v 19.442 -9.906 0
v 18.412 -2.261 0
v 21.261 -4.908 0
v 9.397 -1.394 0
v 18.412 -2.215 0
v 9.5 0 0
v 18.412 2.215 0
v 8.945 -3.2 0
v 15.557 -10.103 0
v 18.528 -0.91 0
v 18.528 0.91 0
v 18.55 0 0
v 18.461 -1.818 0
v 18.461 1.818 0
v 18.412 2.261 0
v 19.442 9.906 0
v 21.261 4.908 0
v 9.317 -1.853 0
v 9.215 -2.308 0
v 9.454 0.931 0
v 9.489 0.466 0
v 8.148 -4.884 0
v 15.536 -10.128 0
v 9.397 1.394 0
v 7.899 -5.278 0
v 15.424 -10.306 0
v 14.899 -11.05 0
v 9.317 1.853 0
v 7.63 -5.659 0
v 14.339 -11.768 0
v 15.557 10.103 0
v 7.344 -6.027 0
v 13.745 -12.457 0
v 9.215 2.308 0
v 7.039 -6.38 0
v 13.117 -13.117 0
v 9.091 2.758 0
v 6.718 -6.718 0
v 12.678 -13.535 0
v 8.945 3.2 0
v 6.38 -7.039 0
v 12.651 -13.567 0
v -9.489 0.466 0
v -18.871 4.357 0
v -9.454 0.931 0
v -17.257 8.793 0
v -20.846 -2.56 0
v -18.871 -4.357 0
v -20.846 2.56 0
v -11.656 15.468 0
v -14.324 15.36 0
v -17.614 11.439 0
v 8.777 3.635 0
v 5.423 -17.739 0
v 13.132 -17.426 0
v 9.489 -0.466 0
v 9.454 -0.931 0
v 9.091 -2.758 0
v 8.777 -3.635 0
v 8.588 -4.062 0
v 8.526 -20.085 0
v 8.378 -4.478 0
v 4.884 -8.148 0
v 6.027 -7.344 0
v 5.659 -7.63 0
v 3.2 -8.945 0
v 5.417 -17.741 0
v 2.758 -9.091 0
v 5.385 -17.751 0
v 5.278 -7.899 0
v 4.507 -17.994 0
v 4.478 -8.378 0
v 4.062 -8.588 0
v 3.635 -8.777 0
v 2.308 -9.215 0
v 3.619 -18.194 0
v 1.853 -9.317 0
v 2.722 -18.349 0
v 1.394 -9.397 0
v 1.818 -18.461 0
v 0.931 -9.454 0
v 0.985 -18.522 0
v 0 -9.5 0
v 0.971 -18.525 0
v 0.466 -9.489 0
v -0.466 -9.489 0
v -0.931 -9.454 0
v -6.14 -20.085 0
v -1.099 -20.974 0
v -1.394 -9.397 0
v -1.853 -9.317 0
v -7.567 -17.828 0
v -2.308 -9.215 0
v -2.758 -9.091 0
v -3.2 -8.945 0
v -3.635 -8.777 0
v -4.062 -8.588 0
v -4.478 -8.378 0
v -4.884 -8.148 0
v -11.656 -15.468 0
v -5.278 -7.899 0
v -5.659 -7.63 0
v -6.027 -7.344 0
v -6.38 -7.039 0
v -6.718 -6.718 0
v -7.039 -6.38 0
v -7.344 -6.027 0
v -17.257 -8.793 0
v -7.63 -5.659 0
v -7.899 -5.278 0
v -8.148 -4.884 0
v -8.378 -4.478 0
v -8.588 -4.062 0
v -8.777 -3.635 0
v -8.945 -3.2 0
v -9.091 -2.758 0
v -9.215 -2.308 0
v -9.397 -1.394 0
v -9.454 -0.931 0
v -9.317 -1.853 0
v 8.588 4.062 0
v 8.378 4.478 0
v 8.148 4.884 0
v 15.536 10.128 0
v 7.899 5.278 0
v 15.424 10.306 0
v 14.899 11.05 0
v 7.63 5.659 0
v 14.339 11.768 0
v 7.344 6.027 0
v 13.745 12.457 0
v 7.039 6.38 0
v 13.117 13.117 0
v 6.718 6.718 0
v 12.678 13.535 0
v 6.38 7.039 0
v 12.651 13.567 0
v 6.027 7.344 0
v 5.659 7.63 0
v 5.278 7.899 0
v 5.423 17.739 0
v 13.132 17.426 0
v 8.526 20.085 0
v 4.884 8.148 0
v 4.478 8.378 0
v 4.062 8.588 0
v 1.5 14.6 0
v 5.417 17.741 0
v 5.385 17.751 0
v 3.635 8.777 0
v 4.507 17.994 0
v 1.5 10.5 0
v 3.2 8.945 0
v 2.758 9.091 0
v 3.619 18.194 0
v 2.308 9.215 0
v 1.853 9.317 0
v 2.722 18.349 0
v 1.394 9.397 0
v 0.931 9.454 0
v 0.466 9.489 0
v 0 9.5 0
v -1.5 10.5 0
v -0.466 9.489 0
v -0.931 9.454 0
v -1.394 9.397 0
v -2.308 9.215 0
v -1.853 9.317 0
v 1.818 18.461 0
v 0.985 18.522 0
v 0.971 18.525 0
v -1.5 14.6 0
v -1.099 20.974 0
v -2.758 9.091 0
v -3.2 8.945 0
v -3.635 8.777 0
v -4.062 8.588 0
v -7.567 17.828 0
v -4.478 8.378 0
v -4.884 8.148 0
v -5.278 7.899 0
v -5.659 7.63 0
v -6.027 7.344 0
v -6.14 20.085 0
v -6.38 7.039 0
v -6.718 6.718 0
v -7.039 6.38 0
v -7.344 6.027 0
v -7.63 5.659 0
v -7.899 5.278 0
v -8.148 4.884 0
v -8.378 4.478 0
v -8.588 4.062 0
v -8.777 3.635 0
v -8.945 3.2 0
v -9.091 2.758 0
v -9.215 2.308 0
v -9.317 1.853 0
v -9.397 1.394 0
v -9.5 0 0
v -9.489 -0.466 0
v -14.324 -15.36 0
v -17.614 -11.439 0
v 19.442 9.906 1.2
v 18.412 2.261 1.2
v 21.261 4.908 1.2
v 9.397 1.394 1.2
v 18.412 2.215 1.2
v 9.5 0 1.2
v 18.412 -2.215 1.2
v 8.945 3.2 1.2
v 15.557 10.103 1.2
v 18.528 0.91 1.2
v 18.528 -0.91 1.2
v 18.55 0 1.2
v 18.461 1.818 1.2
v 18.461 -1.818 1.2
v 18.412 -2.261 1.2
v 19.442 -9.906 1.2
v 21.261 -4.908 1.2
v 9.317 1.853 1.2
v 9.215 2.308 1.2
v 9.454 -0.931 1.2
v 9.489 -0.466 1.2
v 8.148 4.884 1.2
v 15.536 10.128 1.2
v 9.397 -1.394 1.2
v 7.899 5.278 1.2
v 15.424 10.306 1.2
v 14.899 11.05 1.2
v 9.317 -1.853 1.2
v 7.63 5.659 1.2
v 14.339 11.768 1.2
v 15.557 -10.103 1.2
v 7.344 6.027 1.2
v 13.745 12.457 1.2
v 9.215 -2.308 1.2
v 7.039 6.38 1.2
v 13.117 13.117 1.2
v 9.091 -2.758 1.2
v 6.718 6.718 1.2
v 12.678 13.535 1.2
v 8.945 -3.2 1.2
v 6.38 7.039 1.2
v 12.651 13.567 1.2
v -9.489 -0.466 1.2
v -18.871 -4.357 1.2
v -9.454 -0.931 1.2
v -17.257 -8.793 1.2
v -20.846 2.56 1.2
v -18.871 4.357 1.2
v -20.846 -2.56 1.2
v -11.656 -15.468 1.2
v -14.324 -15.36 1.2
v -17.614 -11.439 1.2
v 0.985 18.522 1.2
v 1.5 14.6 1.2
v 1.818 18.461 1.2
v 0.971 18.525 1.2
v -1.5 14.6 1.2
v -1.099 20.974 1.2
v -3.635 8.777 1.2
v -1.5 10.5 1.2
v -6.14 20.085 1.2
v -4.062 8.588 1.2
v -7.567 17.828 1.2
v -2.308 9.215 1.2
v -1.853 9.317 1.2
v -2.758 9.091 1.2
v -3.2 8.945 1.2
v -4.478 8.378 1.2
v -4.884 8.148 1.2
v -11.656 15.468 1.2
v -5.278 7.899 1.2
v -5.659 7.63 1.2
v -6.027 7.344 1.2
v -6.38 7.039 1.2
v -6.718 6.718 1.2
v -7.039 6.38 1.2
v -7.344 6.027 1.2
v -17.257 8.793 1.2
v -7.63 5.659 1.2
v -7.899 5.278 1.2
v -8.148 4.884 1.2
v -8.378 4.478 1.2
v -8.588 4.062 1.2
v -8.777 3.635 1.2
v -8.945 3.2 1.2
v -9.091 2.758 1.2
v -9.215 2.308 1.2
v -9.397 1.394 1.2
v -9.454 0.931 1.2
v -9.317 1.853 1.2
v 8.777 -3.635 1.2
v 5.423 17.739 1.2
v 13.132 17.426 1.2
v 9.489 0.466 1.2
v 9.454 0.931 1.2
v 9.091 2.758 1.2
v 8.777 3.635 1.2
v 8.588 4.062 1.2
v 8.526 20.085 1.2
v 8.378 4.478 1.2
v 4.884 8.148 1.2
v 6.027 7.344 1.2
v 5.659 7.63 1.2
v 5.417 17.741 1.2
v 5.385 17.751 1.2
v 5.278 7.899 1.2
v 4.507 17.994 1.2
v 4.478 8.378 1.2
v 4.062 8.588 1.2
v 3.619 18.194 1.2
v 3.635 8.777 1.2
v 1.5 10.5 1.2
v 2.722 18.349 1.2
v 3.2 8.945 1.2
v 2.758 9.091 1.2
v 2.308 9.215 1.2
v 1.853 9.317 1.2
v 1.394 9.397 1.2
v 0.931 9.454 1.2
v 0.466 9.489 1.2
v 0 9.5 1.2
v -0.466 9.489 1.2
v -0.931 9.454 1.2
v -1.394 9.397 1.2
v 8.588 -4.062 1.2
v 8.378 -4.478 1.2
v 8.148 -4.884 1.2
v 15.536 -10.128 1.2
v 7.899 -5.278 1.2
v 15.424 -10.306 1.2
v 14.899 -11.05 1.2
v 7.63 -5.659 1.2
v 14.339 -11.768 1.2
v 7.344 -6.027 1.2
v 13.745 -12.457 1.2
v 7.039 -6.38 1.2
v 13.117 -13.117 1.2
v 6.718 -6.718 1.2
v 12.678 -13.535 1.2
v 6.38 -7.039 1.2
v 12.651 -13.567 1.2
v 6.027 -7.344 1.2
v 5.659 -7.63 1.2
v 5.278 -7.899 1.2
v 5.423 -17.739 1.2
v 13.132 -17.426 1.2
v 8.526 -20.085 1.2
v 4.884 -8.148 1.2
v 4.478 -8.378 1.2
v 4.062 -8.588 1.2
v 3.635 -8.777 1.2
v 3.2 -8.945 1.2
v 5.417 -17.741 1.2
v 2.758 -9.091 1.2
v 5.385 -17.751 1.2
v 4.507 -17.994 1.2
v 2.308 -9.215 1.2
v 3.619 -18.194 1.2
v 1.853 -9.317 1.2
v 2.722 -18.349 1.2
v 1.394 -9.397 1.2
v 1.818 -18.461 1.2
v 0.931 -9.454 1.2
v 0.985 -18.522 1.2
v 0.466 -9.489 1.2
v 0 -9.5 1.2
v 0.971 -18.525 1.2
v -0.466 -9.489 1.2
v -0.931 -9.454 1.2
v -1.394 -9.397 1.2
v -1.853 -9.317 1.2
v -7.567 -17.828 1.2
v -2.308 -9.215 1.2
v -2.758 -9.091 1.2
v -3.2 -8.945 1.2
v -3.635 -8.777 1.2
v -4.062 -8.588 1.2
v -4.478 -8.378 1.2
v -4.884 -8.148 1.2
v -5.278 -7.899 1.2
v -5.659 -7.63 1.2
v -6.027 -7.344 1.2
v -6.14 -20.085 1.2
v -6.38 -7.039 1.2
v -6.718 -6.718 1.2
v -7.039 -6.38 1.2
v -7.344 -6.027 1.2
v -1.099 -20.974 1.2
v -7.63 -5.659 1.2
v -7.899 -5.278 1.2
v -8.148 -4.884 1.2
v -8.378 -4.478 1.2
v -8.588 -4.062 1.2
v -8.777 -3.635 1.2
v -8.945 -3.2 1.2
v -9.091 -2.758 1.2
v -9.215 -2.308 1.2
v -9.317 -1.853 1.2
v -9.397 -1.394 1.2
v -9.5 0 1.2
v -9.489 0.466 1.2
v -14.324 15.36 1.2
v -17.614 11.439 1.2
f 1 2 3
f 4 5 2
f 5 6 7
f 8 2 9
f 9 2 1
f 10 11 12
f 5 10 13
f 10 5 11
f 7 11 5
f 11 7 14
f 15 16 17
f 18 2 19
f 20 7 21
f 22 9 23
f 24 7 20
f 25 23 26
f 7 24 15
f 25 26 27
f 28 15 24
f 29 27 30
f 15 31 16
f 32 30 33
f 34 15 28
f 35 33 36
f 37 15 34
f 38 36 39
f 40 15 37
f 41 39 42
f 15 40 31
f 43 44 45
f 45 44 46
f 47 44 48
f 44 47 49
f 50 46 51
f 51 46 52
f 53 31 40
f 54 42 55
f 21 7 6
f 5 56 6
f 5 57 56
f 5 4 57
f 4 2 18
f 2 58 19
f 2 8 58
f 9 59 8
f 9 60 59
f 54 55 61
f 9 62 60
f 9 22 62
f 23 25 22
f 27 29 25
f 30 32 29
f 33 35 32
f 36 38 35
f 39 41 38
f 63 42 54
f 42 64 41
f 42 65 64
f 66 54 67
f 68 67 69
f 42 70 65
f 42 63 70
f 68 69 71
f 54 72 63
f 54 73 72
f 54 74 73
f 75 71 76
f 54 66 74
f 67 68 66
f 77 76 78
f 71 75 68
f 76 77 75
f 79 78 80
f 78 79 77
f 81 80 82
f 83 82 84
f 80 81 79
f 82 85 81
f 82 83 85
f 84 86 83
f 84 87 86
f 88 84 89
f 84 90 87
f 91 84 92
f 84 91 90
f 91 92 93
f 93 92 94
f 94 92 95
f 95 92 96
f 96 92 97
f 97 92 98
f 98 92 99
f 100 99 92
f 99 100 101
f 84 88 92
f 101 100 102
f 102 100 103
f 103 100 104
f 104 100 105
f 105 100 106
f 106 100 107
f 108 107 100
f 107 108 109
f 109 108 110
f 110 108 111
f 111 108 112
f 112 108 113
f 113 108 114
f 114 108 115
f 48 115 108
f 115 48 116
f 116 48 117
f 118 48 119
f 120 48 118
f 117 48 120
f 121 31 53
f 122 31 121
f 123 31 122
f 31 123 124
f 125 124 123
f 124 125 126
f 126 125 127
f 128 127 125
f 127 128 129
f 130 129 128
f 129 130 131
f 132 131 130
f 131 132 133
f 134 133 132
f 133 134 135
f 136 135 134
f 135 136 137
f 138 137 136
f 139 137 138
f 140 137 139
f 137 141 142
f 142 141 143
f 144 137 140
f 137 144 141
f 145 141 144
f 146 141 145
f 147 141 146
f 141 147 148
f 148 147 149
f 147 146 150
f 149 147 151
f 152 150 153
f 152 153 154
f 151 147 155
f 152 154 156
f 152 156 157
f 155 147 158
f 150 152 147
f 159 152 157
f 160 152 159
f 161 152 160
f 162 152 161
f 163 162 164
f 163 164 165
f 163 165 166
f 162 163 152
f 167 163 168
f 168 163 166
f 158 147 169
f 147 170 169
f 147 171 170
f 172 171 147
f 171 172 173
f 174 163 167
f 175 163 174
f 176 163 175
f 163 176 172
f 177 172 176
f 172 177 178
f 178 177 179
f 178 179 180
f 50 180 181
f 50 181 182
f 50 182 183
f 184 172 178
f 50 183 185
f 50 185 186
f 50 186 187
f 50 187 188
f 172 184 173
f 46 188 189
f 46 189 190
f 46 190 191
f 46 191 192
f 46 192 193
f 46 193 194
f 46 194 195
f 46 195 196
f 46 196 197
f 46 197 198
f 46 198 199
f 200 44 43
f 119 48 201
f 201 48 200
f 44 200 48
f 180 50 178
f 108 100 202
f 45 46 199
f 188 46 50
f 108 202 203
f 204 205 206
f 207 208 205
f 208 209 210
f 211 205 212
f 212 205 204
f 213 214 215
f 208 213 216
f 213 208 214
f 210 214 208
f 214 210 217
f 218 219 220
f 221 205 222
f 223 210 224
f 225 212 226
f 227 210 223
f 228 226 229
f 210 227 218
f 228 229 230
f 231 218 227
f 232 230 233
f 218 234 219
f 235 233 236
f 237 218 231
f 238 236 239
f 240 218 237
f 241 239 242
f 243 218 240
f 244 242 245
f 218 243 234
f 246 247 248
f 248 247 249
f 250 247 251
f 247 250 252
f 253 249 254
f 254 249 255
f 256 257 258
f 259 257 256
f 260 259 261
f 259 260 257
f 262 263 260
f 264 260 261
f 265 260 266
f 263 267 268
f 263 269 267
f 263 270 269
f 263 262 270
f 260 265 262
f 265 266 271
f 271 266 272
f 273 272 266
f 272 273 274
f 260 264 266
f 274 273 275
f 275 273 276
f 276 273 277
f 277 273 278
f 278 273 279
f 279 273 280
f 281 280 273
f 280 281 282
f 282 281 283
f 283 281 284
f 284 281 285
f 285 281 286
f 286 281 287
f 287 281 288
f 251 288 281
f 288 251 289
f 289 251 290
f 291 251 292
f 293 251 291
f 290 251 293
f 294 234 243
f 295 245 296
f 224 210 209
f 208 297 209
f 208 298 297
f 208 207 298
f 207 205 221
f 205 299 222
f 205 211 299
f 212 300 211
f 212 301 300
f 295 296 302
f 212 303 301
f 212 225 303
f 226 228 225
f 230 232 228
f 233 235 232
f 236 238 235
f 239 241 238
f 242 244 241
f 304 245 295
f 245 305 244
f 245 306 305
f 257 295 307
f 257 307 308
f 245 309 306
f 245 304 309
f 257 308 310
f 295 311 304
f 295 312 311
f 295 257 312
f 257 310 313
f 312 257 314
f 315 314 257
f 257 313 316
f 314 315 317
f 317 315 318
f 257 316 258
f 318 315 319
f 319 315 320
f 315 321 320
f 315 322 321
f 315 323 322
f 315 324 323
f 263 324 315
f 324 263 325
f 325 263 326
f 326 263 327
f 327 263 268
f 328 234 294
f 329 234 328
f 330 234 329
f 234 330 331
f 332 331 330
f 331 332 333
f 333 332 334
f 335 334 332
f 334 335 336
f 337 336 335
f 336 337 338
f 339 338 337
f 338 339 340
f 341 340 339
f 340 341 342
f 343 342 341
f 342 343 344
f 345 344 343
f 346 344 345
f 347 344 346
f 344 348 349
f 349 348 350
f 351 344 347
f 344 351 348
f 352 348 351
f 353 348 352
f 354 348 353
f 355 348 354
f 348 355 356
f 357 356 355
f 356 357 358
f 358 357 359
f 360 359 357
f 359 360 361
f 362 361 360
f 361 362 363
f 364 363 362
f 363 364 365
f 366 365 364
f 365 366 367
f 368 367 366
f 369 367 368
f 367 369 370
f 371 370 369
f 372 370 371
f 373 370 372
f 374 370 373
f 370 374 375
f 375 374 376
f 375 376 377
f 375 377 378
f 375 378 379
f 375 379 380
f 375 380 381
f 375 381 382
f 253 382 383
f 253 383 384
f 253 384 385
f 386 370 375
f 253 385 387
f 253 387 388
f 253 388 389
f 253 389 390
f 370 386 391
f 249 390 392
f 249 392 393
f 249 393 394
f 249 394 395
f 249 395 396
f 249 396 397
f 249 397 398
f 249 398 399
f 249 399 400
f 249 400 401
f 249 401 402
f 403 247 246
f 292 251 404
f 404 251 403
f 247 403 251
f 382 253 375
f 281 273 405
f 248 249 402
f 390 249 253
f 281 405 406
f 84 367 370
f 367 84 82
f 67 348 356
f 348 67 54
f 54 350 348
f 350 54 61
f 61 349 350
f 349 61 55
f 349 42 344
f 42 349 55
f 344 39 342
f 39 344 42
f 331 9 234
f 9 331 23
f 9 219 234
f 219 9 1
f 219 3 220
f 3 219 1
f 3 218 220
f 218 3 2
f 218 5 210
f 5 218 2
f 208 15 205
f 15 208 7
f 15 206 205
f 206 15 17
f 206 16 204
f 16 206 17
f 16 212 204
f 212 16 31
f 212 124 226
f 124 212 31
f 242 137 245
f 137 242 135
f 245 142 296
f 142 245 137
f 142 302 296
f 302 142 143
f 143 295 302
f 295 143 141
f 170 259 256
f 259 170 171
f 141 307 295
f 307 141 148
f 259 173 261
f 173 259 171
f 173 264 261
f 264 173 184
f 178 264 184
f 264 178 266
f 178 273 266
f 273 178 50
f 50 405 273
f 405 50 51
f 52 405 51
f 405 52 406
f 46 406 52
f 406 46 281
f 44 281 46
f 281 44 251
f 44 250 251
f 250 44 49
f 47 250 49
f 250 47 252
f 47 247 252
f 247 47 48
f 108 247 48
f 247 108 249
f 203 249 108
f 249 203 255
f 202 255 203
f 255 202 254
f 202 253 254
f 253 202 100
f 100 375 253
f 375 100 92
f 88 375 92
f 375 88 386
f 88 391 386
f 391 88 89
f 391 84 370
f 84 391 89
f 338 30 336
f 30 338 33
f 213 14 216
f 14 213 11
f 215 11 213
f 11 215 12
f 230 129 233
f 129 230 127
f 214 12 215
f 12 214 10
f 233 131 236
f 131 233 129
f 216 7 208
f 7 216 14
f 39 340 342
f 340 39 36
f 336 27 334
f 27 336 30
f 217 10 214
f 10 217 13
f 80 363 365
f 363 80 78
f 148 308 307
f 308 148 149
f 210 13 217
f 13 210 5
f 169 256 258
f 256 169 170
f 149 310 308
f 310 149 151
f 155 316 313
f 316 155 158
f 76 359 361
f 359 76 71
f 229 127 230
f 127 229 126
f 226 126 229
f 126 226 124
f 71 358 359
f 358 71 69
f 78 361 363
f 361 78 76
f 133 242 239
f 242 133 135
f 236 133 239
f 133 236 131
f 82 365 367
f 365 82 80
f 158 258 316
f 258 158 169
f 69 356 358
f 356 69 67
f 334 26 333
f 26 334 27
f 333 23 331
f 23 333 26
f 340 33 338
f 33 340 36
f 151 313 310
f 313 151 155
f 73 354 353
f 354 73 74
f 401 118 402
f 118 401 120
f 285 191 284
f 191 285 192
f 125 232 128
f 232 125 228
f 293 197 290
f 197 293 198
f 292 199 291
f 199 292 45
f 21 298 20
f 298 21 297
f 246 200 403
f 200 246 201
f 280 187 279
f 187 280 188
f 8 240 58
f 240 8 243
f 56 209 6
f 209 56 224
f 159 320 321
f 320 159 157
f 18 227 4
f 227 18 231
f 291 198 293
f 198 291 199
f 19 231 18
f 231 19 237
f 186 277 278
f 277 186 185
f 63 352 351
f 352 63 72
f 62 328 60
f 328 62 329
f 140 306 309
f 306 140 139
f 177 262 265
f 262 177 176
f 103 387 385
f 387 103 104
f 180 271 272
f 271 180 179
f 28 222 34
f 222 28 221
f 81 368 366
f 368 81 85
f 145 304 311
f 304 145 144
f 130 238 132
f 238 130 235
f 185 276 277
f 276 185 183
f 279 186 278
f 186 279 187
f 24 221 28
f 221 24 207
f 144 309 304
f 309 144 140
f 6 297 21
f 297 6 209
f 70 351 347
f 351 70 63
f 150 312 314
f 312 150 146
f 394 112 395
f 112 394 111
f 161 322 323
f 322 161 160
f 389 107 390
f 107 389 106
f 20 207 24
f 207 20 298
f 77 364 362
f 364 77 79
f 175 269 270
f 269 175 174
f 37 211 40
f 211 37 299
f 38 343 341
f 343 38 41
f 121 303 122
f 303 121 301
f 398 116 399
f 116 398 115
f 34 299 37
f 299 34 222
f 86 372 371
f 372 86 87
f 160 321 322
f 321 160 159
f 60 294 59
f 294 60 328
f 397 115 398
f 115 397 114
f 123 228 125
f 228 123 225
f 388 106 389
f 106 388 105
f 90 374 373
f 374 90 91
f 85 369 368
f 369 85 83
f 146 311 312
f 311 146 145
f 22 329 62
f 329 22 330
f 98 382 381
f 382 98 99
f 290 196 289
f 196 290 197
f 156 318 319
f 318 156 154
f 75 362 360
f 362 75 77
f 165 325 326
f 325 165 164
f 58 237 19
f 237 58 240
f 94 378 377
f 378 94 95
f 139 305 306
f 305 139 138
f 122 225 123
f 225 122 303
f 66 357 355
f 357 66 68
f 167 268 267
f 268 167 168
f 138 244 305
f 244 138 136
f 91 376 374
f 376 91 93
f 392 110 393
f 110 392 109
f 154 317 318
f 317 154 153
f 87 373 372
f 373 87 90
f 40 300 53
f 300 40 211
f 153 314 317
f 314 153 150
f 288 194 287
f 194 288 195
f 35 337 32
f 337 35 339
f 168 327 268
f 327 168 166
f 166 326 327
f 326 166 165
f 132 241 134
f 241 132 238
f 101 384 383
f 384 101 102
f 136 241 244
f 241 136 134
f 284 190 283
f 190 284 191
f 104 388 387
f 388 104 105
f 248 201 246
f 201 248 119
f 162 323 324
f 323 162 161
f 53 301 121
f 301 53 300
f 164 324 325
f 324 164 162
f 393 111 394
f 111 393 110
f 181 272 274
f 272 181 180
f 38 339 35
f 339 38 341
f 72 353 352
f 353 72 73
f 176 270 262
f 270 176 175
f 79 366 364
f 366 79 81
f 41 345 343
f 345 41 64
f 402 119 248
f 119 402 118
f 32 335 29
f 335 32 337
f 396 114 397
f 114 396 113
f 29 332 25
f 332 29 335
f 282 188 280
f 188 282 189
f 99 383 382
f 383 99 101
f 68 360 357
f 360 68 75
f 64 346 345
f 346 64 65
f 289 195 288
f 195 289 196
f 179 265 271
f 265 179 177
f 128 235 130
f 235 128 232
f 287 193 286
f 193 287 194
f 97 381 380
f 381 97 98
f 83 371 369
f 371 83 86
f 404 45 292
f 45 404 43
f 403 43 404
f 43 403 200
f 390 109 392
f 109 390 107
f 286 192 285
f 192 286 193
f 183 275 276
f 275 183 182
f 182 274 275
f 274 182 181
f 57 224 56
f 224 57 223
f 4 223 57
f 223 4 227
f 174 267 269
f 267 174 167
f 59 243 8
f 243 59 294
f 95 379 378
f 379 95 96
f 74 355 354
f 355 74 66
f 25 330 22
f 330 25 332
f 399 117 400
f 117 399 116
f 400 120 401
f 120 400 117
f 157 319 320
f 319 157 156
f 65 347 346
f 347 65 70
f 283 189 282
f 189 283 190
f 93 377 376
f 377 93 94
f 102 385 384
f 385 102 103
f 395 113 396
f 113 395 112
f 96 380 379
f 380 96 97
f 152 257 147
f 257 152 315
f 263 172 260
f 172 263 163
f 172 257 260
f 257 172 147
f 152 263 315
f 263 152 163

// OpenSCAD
/*
  Elna Supermatic cam 20
  Name: Source profile 20
  Status: source-profile

  Generated from measured parametric base v2.
  Surface mode: stepped
*/

include <_elna_measured_common.scad>;

profile_points = [
        [0.9708, 18.5246],
        [5.4235, 17.7395],
        [8.5258, 20.0854],
        [13.1316, 17.4262],
        [12.6511, 13.5666],
        [15.5573, 10.1031],
        [19.4418, 9.9061],
        [21.2608, 4.9084],
        [18.4117, 2.2607],
        [18.4117, -2.2607],
        [21.2608, -4.9084],
        [19.4418, -9.9061],
        [15.5573, -10.1031],
        [12.6511, -13.5666],
        [13.1316, -17.4262],
        [8.5258, -20.0854],
        [5.4235, -17.7395],
        [0.9708, -18.5246],
        [-1.0992, -20.9737],
        [-6.1405, -20.0848],
        [-7.5675, -17.8279],
        [-11.6557, -15.4676],
        [-14.3237, -15.3603],
        [-17.6142, -11.4388],
        [-17.2566, -8.7927],
        [-18.8711, -4.3567],
        [-20.8460, -2.5596],
        [-20.8460, 2.5596],
        [-18.8711, 4.3567],
        [-17.2566, 8.7927],
        [-17.6142, 11.4388],
        [-14.3237, 15.3603],
        [-11.6557, 15.4676],
        [-7.5675, 17.8279],
        [-6.1405, 20.0848],
        [-1.0992, 20.9737]
];

icon_points = [[-1.000,0.180], [-0.820,0.180], [-0.820,0.360], [-0.640,0.360], [-0.640,0.560], [-0.460,0.560], [-0.460,0.740], [-0.280,0.740], [-0.280,0.560], [-0.100,0.560], [-0.100,0.360], [0.080,0.360], [0.080,0.180], [0.260,0.180], [0.260,0.360], [0.440,0.360], [0.440,0.560], [0.620,0.560], [0.620,0.740], [0.800,0.740], [1.000,0.740]];

elna_cam_ring(profile_points=profile_points);
